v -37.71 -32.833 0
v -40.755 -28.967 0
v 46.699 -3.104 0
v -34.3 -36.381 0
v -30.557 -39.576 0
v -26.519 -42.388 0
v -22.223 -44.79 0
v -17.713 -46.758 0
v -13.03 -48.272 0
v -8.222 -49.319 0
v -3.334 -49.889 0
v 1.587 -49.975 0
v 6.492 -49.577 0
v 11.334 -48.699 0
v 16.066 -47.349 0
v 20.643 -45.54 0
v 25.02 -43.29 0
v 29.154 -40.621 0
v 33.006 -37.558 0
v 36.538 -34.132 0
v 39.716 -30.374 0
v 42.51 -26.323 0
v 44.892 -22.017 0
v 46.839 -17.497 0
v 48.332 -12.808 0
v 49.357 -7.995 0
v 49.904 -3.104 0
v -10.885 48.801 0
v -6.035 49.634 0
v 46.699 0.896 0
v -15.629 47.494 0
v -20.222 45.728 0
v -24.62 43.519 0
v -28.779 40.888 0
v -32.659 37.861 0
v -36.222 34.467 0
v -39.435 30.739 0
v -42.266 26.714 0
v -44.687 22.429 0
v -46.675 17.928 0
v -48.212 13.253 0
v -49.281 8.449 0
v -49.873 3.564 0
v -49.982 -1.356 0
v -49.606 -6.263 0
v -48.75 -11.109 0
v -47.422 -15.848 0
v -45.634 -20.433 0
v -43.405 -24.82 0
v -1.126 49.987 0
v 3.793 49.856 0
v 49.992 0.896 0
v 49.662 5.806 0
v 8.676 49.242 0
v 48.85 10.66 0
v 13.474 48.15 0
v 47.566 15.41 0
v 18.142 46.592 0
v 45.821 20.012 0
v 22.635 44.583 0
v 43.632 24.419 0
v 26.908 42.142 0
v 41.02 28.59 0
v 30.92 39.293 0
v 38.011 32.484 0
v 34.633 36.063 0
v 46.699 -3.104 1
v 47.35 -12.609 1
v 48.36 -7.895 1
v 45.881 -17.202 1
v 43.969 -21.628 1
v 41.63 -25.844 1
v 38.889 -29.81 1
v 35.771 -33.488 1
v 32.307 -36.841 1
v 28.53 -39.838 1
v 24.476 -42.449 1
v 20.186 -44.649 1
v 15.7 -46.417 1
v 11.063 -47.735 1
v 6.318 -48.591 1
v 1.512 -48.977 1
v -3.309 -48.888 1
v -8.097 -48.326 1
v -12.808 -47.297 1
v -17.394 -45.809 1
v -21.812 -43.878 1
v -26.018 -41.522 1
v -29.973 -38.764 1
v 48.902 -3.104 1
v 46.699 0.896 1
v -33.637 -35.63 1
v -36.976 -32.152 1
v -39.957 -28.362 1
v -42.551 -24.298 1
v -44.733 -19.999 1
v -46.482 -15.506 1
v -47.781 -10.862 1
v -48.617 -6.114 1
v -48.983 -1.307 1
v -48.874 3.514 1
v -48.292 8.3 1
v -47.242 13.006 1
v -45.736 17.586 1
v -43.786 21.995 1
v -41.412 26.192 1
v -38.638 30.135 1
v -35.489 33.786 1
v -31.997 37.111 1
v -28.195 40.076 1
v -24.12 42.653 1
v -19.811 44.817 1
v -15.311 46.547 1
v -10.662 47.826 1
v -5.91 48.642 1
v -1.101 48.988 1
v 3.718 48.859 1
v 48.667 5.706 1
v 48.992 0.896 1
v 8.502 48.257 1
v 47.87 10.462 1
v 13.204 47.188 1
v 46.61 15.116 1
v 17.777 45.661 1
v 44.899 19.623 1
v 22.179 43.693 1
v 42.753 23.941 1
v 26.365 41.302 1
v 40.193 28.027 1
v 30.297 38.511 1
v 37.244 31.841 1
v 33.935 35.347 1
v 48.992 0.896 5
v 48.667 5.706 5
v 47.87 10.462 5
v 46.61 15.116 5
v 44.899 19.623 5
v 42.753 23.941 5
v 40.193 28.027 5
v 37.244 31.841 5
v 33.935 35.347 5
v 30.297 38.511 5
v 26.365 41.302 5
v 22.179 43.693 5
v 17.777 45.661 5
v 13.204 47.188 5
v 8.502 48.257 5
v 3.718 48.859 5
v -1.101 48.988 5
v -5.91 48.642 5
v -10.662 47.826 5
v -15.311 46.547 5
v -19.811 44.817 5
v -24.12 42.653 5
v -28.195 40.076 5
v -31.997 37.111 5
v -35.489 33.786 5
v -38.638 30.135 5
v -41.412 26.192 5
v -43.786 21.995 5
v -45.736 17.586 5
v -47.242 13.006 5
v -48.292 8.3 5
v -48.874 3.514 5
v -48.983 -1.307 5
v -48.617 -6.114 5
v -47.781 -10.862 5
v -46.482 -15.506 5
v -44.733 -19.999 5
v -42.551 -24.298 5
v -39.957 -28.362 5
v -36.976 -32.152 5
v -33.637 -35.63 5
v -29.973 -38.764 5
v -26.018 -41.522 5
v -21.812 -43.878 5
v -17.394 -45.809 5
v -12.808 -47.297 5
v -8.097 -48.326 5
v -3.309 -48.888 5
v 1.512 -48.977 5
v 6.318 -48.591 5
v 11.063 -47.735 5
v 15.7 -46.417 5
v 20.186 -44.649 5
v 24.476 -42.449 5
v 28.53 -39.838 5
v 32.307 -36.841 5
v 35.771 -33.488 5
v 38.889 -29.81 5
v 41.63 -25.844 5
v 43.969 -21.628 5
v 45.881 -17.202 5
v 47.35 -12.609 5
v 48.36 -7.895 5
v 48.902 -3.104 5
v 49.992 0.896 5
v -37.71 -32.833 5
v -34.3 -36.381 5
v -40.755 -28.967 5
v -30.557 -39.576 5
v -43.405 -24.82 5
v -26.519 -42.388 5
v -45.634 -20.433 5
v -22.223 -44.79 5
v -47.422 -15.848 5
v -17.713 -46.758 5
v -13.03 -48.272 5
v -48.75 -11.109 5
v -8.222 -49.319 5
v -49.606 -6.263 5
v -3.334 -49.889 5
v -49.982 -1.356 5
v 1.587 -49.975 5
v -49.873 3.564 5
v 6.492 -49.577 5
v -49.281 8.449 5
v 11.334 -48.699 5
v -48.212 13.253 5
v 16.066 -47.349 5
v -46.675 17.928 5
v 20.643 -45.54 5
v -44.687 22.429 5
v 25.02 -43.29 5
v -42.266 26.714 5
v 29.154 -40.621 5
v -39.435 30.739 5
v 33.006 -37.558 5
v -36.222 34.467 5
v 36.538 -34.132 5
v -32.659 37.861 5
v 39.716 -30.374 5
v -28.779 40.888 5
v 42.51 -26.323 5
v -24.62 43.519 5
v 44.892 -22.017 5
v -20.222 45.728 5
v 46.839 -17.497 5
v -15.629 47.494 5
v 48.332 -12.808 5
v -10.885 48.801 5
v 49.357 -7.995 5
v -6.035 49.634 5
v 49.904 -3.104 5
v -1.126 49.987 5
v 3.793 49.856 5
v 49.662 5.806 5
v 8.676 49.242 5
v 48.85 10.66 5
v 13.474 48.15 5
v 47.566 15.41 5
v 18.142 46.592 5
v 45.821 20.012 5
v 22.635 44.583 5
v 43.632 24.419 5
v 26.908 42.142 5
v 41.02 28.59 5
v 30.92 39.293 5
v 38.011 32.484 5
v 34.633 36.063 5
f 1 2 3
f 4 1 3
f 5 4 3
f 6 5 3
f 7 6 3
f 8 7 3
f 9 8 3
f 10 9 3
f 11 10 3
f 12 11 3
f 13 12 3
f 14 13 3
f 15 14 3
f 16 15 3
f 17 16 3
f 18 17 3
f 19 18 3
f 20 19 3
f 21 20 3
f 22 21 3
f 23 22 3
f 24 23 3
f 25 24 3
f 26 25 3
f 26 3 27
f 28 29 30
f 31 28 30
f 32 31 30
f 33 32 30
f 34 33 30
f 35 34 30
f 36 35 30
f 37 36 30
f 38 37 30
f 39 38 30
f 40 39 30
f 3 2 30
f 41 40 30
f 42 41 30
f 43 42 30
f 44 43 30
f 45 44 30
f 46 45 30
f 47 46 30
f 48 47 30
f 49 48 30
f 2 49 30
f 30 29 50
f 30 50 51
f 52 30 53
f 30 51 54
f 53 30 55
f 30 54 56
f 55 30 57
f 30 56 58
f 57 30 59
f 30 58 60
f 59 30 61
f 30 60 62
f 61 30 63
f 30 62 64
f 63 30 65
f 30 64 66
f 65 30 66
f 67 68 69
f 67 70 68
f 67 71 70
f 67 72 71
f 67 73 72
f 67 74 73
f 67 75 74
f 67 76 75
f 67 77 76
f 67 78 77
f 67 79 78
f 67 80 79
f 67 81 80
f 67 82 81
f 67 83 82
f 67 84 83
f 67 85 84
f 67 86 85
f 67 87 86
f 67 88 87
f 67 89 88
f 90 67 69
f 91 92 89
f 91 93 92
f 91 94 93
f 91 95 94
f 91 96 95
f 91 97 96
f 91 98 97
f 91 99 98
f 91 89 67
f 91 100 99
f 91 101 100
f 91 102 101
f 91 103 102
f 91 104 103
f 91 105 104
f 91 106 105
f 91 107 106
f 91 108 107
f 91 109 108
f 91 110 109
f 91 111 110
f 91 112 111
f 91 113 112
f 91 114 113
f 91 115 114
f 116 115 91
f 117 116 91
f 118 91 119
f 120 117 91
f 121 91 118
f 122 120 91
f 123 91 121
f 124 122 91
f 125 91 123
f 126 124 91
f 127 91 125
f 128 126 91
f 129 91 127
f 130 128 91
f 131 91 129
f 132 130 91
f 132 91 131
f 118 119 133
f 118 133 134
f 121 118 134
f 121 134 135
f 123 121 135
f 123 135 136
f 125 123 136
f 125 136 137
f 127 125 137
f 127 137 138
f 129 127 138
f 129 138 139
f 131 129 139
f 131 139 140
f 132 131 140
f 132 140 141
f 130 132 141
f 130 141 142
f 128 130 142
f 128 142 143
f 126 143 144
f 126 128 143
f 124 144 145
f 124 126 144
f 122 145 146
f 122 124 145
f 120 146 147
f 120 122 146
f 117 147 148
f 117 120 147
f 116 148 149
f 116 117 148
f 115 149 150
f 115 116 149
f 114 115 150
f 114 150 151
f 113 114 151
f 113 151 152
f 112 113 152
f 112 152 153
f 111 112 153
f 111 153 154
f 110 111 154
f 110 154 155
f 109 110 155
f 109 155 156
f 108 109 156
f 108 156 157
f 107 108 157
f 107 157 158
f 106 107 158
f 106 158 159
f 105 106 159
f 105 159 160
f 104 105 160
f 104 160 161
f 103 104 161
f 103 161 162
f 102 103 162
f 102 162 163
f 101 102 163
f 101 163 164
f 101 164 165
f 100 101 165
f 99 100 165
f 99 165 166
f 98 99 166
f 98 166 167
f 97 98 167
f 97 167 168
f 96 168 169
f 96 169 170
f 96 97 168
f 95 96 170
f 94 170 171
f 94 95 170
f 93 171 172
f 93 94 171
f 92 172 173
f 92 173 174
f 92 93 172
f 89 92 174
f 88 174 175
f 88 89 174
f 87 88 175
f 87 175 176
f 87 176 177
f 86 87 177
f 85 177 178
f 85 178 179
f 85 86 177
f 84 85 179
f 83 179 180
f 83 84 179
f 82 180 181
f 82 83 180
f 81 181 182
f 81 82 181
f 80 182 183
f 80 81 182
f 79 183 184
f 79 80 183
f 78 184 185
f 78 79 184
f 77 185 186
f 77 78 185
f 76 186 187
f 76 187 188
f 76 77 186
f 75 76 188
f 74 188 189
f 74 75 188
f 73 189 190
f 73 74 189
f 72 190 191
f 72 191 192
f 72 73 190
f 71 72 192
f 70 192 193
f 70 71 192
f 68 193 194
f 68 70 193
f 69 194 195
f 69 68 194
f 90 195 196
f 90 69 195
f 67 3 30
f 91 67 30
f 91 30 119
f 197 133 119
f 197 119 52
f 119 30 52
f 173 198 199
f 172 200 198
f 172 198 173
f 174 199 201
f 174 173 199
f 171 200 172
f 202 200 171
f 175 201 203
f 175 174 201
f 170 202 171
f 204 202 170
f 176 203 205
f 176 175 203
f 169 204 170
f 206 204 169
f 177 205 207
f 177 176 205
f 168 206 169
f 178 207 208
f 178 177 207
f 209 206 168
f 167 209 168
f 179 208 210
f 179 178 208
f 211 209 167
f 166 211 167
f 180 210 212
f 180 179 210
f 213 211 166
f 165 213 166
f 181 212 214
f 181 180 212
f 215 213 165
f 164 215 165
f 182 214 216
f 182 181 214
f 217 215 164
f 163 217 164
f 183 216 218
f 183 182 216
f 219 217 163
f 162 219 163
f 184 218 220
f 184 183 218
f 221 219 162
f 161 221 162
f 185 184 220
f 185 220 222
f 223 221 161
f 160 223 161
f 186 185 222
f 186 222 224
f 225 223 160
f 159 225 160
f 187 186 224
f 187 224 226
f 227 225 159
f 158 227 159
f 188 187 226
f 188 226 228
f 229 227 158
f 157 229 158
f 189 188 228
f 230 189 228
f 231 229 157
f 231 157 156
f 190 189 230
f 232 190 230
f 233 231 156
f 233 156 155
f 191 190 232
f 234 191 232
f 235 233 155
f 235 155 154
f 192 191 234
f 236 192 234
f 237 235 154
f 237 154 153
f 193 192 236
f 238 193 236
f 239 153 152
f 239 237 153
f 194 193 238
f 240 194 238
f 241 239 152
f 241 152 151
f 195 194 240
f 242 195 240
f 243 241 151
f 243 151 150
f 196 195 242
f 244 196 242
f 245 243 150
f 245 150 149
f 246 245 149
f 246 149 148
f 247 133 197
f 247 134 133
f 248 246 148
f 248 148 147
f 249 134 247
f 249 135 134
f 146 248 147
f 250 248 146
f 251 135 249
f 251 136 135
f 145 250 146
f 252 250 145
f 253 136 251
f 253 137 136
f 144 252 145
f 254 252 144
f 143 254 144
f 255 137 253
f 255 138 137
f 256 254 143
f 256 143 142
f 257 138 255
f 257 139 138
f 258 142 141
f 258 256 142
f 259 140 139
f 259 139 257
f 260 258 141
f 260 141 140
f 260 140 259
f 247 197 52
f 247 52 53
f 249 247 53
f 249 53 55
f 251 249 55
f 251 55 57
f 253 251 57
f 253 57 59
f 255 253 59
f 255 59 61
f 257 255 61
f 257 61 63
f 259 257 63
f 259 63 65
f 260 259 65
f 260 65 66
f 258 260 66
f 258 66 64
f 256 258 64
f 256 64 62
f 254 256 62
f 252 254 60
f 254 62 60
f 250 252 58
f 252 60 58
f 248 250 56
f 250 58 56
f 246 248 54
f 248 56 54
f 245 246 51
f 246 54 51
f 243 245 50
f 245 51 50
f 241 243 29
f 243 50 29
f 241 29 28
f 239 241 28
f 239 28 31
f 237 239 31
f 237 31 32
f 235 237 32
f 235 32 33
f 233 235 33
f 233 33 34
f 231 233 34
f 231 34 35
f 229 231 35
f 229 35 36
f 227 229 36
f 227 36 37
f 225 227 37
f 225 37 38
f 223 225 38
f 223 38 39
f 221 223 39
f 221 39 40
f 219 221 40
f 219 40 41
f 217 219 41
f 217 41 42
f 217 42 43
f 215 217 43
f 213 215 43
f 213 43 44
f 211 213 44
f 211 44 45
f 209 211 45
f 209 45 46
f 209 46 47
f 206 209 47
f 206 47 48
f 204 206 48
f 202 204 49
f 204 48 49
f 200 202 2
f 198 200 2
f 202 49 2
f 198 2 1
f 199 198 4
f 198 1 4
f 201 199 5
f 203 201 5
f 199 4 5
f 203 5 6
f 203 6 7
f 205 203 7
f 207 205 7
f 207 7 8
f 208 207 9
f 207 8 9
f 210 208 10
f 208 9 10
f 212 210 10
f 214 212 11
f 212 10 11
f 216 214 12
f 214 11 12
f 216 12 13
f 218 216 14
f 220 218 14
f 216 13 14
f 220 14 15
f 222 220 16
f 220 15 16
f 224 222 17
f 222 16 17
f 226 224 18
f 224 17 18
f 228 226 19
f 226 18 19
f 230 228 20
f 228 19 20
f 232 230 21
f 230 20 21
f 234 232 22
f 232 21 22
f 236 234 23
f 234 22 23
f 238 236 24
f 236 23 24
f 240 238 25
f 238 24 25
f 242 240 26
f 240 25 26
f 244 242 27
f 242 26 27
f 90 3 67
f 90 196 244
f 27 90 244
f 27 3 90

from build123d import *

# Parameters (mm, degrees)
F0_R     = 50
F1_DEPTH = 5
F2_T     = -1
F3_W     = 4
F3_H     = 4
F4_DEPTH = 6


# Not quite as in the source:
# - the program builds the solid bodies; features that only make, move or delete a surface that nothing else refers to are left out


with BuildPart() as f1:
    # F0 (on Top) → F1 (new body)
    with BuildSketch(Plane.XY):
        Circle(F0_R)
    extrude(amount=F1_DEPTH)

    # F2
    f2_openings = [f1.faces().sort_by_distance(p)[0] for p in [
        (0, 0, 5),
    ]]
    offset(amount=F2_T, openings=f2_openings)

    # F3 (on Top) → F4 (cut)
    with BuildSketch(Plane.XY):
        with Locations((48.6989099085, -1.1040147878)):
            Rectangle(F3_W, F3_H)
    extrude(amount=F4_DEPTH, mode=Mode.SUBTRACT)


solid = f1.part
